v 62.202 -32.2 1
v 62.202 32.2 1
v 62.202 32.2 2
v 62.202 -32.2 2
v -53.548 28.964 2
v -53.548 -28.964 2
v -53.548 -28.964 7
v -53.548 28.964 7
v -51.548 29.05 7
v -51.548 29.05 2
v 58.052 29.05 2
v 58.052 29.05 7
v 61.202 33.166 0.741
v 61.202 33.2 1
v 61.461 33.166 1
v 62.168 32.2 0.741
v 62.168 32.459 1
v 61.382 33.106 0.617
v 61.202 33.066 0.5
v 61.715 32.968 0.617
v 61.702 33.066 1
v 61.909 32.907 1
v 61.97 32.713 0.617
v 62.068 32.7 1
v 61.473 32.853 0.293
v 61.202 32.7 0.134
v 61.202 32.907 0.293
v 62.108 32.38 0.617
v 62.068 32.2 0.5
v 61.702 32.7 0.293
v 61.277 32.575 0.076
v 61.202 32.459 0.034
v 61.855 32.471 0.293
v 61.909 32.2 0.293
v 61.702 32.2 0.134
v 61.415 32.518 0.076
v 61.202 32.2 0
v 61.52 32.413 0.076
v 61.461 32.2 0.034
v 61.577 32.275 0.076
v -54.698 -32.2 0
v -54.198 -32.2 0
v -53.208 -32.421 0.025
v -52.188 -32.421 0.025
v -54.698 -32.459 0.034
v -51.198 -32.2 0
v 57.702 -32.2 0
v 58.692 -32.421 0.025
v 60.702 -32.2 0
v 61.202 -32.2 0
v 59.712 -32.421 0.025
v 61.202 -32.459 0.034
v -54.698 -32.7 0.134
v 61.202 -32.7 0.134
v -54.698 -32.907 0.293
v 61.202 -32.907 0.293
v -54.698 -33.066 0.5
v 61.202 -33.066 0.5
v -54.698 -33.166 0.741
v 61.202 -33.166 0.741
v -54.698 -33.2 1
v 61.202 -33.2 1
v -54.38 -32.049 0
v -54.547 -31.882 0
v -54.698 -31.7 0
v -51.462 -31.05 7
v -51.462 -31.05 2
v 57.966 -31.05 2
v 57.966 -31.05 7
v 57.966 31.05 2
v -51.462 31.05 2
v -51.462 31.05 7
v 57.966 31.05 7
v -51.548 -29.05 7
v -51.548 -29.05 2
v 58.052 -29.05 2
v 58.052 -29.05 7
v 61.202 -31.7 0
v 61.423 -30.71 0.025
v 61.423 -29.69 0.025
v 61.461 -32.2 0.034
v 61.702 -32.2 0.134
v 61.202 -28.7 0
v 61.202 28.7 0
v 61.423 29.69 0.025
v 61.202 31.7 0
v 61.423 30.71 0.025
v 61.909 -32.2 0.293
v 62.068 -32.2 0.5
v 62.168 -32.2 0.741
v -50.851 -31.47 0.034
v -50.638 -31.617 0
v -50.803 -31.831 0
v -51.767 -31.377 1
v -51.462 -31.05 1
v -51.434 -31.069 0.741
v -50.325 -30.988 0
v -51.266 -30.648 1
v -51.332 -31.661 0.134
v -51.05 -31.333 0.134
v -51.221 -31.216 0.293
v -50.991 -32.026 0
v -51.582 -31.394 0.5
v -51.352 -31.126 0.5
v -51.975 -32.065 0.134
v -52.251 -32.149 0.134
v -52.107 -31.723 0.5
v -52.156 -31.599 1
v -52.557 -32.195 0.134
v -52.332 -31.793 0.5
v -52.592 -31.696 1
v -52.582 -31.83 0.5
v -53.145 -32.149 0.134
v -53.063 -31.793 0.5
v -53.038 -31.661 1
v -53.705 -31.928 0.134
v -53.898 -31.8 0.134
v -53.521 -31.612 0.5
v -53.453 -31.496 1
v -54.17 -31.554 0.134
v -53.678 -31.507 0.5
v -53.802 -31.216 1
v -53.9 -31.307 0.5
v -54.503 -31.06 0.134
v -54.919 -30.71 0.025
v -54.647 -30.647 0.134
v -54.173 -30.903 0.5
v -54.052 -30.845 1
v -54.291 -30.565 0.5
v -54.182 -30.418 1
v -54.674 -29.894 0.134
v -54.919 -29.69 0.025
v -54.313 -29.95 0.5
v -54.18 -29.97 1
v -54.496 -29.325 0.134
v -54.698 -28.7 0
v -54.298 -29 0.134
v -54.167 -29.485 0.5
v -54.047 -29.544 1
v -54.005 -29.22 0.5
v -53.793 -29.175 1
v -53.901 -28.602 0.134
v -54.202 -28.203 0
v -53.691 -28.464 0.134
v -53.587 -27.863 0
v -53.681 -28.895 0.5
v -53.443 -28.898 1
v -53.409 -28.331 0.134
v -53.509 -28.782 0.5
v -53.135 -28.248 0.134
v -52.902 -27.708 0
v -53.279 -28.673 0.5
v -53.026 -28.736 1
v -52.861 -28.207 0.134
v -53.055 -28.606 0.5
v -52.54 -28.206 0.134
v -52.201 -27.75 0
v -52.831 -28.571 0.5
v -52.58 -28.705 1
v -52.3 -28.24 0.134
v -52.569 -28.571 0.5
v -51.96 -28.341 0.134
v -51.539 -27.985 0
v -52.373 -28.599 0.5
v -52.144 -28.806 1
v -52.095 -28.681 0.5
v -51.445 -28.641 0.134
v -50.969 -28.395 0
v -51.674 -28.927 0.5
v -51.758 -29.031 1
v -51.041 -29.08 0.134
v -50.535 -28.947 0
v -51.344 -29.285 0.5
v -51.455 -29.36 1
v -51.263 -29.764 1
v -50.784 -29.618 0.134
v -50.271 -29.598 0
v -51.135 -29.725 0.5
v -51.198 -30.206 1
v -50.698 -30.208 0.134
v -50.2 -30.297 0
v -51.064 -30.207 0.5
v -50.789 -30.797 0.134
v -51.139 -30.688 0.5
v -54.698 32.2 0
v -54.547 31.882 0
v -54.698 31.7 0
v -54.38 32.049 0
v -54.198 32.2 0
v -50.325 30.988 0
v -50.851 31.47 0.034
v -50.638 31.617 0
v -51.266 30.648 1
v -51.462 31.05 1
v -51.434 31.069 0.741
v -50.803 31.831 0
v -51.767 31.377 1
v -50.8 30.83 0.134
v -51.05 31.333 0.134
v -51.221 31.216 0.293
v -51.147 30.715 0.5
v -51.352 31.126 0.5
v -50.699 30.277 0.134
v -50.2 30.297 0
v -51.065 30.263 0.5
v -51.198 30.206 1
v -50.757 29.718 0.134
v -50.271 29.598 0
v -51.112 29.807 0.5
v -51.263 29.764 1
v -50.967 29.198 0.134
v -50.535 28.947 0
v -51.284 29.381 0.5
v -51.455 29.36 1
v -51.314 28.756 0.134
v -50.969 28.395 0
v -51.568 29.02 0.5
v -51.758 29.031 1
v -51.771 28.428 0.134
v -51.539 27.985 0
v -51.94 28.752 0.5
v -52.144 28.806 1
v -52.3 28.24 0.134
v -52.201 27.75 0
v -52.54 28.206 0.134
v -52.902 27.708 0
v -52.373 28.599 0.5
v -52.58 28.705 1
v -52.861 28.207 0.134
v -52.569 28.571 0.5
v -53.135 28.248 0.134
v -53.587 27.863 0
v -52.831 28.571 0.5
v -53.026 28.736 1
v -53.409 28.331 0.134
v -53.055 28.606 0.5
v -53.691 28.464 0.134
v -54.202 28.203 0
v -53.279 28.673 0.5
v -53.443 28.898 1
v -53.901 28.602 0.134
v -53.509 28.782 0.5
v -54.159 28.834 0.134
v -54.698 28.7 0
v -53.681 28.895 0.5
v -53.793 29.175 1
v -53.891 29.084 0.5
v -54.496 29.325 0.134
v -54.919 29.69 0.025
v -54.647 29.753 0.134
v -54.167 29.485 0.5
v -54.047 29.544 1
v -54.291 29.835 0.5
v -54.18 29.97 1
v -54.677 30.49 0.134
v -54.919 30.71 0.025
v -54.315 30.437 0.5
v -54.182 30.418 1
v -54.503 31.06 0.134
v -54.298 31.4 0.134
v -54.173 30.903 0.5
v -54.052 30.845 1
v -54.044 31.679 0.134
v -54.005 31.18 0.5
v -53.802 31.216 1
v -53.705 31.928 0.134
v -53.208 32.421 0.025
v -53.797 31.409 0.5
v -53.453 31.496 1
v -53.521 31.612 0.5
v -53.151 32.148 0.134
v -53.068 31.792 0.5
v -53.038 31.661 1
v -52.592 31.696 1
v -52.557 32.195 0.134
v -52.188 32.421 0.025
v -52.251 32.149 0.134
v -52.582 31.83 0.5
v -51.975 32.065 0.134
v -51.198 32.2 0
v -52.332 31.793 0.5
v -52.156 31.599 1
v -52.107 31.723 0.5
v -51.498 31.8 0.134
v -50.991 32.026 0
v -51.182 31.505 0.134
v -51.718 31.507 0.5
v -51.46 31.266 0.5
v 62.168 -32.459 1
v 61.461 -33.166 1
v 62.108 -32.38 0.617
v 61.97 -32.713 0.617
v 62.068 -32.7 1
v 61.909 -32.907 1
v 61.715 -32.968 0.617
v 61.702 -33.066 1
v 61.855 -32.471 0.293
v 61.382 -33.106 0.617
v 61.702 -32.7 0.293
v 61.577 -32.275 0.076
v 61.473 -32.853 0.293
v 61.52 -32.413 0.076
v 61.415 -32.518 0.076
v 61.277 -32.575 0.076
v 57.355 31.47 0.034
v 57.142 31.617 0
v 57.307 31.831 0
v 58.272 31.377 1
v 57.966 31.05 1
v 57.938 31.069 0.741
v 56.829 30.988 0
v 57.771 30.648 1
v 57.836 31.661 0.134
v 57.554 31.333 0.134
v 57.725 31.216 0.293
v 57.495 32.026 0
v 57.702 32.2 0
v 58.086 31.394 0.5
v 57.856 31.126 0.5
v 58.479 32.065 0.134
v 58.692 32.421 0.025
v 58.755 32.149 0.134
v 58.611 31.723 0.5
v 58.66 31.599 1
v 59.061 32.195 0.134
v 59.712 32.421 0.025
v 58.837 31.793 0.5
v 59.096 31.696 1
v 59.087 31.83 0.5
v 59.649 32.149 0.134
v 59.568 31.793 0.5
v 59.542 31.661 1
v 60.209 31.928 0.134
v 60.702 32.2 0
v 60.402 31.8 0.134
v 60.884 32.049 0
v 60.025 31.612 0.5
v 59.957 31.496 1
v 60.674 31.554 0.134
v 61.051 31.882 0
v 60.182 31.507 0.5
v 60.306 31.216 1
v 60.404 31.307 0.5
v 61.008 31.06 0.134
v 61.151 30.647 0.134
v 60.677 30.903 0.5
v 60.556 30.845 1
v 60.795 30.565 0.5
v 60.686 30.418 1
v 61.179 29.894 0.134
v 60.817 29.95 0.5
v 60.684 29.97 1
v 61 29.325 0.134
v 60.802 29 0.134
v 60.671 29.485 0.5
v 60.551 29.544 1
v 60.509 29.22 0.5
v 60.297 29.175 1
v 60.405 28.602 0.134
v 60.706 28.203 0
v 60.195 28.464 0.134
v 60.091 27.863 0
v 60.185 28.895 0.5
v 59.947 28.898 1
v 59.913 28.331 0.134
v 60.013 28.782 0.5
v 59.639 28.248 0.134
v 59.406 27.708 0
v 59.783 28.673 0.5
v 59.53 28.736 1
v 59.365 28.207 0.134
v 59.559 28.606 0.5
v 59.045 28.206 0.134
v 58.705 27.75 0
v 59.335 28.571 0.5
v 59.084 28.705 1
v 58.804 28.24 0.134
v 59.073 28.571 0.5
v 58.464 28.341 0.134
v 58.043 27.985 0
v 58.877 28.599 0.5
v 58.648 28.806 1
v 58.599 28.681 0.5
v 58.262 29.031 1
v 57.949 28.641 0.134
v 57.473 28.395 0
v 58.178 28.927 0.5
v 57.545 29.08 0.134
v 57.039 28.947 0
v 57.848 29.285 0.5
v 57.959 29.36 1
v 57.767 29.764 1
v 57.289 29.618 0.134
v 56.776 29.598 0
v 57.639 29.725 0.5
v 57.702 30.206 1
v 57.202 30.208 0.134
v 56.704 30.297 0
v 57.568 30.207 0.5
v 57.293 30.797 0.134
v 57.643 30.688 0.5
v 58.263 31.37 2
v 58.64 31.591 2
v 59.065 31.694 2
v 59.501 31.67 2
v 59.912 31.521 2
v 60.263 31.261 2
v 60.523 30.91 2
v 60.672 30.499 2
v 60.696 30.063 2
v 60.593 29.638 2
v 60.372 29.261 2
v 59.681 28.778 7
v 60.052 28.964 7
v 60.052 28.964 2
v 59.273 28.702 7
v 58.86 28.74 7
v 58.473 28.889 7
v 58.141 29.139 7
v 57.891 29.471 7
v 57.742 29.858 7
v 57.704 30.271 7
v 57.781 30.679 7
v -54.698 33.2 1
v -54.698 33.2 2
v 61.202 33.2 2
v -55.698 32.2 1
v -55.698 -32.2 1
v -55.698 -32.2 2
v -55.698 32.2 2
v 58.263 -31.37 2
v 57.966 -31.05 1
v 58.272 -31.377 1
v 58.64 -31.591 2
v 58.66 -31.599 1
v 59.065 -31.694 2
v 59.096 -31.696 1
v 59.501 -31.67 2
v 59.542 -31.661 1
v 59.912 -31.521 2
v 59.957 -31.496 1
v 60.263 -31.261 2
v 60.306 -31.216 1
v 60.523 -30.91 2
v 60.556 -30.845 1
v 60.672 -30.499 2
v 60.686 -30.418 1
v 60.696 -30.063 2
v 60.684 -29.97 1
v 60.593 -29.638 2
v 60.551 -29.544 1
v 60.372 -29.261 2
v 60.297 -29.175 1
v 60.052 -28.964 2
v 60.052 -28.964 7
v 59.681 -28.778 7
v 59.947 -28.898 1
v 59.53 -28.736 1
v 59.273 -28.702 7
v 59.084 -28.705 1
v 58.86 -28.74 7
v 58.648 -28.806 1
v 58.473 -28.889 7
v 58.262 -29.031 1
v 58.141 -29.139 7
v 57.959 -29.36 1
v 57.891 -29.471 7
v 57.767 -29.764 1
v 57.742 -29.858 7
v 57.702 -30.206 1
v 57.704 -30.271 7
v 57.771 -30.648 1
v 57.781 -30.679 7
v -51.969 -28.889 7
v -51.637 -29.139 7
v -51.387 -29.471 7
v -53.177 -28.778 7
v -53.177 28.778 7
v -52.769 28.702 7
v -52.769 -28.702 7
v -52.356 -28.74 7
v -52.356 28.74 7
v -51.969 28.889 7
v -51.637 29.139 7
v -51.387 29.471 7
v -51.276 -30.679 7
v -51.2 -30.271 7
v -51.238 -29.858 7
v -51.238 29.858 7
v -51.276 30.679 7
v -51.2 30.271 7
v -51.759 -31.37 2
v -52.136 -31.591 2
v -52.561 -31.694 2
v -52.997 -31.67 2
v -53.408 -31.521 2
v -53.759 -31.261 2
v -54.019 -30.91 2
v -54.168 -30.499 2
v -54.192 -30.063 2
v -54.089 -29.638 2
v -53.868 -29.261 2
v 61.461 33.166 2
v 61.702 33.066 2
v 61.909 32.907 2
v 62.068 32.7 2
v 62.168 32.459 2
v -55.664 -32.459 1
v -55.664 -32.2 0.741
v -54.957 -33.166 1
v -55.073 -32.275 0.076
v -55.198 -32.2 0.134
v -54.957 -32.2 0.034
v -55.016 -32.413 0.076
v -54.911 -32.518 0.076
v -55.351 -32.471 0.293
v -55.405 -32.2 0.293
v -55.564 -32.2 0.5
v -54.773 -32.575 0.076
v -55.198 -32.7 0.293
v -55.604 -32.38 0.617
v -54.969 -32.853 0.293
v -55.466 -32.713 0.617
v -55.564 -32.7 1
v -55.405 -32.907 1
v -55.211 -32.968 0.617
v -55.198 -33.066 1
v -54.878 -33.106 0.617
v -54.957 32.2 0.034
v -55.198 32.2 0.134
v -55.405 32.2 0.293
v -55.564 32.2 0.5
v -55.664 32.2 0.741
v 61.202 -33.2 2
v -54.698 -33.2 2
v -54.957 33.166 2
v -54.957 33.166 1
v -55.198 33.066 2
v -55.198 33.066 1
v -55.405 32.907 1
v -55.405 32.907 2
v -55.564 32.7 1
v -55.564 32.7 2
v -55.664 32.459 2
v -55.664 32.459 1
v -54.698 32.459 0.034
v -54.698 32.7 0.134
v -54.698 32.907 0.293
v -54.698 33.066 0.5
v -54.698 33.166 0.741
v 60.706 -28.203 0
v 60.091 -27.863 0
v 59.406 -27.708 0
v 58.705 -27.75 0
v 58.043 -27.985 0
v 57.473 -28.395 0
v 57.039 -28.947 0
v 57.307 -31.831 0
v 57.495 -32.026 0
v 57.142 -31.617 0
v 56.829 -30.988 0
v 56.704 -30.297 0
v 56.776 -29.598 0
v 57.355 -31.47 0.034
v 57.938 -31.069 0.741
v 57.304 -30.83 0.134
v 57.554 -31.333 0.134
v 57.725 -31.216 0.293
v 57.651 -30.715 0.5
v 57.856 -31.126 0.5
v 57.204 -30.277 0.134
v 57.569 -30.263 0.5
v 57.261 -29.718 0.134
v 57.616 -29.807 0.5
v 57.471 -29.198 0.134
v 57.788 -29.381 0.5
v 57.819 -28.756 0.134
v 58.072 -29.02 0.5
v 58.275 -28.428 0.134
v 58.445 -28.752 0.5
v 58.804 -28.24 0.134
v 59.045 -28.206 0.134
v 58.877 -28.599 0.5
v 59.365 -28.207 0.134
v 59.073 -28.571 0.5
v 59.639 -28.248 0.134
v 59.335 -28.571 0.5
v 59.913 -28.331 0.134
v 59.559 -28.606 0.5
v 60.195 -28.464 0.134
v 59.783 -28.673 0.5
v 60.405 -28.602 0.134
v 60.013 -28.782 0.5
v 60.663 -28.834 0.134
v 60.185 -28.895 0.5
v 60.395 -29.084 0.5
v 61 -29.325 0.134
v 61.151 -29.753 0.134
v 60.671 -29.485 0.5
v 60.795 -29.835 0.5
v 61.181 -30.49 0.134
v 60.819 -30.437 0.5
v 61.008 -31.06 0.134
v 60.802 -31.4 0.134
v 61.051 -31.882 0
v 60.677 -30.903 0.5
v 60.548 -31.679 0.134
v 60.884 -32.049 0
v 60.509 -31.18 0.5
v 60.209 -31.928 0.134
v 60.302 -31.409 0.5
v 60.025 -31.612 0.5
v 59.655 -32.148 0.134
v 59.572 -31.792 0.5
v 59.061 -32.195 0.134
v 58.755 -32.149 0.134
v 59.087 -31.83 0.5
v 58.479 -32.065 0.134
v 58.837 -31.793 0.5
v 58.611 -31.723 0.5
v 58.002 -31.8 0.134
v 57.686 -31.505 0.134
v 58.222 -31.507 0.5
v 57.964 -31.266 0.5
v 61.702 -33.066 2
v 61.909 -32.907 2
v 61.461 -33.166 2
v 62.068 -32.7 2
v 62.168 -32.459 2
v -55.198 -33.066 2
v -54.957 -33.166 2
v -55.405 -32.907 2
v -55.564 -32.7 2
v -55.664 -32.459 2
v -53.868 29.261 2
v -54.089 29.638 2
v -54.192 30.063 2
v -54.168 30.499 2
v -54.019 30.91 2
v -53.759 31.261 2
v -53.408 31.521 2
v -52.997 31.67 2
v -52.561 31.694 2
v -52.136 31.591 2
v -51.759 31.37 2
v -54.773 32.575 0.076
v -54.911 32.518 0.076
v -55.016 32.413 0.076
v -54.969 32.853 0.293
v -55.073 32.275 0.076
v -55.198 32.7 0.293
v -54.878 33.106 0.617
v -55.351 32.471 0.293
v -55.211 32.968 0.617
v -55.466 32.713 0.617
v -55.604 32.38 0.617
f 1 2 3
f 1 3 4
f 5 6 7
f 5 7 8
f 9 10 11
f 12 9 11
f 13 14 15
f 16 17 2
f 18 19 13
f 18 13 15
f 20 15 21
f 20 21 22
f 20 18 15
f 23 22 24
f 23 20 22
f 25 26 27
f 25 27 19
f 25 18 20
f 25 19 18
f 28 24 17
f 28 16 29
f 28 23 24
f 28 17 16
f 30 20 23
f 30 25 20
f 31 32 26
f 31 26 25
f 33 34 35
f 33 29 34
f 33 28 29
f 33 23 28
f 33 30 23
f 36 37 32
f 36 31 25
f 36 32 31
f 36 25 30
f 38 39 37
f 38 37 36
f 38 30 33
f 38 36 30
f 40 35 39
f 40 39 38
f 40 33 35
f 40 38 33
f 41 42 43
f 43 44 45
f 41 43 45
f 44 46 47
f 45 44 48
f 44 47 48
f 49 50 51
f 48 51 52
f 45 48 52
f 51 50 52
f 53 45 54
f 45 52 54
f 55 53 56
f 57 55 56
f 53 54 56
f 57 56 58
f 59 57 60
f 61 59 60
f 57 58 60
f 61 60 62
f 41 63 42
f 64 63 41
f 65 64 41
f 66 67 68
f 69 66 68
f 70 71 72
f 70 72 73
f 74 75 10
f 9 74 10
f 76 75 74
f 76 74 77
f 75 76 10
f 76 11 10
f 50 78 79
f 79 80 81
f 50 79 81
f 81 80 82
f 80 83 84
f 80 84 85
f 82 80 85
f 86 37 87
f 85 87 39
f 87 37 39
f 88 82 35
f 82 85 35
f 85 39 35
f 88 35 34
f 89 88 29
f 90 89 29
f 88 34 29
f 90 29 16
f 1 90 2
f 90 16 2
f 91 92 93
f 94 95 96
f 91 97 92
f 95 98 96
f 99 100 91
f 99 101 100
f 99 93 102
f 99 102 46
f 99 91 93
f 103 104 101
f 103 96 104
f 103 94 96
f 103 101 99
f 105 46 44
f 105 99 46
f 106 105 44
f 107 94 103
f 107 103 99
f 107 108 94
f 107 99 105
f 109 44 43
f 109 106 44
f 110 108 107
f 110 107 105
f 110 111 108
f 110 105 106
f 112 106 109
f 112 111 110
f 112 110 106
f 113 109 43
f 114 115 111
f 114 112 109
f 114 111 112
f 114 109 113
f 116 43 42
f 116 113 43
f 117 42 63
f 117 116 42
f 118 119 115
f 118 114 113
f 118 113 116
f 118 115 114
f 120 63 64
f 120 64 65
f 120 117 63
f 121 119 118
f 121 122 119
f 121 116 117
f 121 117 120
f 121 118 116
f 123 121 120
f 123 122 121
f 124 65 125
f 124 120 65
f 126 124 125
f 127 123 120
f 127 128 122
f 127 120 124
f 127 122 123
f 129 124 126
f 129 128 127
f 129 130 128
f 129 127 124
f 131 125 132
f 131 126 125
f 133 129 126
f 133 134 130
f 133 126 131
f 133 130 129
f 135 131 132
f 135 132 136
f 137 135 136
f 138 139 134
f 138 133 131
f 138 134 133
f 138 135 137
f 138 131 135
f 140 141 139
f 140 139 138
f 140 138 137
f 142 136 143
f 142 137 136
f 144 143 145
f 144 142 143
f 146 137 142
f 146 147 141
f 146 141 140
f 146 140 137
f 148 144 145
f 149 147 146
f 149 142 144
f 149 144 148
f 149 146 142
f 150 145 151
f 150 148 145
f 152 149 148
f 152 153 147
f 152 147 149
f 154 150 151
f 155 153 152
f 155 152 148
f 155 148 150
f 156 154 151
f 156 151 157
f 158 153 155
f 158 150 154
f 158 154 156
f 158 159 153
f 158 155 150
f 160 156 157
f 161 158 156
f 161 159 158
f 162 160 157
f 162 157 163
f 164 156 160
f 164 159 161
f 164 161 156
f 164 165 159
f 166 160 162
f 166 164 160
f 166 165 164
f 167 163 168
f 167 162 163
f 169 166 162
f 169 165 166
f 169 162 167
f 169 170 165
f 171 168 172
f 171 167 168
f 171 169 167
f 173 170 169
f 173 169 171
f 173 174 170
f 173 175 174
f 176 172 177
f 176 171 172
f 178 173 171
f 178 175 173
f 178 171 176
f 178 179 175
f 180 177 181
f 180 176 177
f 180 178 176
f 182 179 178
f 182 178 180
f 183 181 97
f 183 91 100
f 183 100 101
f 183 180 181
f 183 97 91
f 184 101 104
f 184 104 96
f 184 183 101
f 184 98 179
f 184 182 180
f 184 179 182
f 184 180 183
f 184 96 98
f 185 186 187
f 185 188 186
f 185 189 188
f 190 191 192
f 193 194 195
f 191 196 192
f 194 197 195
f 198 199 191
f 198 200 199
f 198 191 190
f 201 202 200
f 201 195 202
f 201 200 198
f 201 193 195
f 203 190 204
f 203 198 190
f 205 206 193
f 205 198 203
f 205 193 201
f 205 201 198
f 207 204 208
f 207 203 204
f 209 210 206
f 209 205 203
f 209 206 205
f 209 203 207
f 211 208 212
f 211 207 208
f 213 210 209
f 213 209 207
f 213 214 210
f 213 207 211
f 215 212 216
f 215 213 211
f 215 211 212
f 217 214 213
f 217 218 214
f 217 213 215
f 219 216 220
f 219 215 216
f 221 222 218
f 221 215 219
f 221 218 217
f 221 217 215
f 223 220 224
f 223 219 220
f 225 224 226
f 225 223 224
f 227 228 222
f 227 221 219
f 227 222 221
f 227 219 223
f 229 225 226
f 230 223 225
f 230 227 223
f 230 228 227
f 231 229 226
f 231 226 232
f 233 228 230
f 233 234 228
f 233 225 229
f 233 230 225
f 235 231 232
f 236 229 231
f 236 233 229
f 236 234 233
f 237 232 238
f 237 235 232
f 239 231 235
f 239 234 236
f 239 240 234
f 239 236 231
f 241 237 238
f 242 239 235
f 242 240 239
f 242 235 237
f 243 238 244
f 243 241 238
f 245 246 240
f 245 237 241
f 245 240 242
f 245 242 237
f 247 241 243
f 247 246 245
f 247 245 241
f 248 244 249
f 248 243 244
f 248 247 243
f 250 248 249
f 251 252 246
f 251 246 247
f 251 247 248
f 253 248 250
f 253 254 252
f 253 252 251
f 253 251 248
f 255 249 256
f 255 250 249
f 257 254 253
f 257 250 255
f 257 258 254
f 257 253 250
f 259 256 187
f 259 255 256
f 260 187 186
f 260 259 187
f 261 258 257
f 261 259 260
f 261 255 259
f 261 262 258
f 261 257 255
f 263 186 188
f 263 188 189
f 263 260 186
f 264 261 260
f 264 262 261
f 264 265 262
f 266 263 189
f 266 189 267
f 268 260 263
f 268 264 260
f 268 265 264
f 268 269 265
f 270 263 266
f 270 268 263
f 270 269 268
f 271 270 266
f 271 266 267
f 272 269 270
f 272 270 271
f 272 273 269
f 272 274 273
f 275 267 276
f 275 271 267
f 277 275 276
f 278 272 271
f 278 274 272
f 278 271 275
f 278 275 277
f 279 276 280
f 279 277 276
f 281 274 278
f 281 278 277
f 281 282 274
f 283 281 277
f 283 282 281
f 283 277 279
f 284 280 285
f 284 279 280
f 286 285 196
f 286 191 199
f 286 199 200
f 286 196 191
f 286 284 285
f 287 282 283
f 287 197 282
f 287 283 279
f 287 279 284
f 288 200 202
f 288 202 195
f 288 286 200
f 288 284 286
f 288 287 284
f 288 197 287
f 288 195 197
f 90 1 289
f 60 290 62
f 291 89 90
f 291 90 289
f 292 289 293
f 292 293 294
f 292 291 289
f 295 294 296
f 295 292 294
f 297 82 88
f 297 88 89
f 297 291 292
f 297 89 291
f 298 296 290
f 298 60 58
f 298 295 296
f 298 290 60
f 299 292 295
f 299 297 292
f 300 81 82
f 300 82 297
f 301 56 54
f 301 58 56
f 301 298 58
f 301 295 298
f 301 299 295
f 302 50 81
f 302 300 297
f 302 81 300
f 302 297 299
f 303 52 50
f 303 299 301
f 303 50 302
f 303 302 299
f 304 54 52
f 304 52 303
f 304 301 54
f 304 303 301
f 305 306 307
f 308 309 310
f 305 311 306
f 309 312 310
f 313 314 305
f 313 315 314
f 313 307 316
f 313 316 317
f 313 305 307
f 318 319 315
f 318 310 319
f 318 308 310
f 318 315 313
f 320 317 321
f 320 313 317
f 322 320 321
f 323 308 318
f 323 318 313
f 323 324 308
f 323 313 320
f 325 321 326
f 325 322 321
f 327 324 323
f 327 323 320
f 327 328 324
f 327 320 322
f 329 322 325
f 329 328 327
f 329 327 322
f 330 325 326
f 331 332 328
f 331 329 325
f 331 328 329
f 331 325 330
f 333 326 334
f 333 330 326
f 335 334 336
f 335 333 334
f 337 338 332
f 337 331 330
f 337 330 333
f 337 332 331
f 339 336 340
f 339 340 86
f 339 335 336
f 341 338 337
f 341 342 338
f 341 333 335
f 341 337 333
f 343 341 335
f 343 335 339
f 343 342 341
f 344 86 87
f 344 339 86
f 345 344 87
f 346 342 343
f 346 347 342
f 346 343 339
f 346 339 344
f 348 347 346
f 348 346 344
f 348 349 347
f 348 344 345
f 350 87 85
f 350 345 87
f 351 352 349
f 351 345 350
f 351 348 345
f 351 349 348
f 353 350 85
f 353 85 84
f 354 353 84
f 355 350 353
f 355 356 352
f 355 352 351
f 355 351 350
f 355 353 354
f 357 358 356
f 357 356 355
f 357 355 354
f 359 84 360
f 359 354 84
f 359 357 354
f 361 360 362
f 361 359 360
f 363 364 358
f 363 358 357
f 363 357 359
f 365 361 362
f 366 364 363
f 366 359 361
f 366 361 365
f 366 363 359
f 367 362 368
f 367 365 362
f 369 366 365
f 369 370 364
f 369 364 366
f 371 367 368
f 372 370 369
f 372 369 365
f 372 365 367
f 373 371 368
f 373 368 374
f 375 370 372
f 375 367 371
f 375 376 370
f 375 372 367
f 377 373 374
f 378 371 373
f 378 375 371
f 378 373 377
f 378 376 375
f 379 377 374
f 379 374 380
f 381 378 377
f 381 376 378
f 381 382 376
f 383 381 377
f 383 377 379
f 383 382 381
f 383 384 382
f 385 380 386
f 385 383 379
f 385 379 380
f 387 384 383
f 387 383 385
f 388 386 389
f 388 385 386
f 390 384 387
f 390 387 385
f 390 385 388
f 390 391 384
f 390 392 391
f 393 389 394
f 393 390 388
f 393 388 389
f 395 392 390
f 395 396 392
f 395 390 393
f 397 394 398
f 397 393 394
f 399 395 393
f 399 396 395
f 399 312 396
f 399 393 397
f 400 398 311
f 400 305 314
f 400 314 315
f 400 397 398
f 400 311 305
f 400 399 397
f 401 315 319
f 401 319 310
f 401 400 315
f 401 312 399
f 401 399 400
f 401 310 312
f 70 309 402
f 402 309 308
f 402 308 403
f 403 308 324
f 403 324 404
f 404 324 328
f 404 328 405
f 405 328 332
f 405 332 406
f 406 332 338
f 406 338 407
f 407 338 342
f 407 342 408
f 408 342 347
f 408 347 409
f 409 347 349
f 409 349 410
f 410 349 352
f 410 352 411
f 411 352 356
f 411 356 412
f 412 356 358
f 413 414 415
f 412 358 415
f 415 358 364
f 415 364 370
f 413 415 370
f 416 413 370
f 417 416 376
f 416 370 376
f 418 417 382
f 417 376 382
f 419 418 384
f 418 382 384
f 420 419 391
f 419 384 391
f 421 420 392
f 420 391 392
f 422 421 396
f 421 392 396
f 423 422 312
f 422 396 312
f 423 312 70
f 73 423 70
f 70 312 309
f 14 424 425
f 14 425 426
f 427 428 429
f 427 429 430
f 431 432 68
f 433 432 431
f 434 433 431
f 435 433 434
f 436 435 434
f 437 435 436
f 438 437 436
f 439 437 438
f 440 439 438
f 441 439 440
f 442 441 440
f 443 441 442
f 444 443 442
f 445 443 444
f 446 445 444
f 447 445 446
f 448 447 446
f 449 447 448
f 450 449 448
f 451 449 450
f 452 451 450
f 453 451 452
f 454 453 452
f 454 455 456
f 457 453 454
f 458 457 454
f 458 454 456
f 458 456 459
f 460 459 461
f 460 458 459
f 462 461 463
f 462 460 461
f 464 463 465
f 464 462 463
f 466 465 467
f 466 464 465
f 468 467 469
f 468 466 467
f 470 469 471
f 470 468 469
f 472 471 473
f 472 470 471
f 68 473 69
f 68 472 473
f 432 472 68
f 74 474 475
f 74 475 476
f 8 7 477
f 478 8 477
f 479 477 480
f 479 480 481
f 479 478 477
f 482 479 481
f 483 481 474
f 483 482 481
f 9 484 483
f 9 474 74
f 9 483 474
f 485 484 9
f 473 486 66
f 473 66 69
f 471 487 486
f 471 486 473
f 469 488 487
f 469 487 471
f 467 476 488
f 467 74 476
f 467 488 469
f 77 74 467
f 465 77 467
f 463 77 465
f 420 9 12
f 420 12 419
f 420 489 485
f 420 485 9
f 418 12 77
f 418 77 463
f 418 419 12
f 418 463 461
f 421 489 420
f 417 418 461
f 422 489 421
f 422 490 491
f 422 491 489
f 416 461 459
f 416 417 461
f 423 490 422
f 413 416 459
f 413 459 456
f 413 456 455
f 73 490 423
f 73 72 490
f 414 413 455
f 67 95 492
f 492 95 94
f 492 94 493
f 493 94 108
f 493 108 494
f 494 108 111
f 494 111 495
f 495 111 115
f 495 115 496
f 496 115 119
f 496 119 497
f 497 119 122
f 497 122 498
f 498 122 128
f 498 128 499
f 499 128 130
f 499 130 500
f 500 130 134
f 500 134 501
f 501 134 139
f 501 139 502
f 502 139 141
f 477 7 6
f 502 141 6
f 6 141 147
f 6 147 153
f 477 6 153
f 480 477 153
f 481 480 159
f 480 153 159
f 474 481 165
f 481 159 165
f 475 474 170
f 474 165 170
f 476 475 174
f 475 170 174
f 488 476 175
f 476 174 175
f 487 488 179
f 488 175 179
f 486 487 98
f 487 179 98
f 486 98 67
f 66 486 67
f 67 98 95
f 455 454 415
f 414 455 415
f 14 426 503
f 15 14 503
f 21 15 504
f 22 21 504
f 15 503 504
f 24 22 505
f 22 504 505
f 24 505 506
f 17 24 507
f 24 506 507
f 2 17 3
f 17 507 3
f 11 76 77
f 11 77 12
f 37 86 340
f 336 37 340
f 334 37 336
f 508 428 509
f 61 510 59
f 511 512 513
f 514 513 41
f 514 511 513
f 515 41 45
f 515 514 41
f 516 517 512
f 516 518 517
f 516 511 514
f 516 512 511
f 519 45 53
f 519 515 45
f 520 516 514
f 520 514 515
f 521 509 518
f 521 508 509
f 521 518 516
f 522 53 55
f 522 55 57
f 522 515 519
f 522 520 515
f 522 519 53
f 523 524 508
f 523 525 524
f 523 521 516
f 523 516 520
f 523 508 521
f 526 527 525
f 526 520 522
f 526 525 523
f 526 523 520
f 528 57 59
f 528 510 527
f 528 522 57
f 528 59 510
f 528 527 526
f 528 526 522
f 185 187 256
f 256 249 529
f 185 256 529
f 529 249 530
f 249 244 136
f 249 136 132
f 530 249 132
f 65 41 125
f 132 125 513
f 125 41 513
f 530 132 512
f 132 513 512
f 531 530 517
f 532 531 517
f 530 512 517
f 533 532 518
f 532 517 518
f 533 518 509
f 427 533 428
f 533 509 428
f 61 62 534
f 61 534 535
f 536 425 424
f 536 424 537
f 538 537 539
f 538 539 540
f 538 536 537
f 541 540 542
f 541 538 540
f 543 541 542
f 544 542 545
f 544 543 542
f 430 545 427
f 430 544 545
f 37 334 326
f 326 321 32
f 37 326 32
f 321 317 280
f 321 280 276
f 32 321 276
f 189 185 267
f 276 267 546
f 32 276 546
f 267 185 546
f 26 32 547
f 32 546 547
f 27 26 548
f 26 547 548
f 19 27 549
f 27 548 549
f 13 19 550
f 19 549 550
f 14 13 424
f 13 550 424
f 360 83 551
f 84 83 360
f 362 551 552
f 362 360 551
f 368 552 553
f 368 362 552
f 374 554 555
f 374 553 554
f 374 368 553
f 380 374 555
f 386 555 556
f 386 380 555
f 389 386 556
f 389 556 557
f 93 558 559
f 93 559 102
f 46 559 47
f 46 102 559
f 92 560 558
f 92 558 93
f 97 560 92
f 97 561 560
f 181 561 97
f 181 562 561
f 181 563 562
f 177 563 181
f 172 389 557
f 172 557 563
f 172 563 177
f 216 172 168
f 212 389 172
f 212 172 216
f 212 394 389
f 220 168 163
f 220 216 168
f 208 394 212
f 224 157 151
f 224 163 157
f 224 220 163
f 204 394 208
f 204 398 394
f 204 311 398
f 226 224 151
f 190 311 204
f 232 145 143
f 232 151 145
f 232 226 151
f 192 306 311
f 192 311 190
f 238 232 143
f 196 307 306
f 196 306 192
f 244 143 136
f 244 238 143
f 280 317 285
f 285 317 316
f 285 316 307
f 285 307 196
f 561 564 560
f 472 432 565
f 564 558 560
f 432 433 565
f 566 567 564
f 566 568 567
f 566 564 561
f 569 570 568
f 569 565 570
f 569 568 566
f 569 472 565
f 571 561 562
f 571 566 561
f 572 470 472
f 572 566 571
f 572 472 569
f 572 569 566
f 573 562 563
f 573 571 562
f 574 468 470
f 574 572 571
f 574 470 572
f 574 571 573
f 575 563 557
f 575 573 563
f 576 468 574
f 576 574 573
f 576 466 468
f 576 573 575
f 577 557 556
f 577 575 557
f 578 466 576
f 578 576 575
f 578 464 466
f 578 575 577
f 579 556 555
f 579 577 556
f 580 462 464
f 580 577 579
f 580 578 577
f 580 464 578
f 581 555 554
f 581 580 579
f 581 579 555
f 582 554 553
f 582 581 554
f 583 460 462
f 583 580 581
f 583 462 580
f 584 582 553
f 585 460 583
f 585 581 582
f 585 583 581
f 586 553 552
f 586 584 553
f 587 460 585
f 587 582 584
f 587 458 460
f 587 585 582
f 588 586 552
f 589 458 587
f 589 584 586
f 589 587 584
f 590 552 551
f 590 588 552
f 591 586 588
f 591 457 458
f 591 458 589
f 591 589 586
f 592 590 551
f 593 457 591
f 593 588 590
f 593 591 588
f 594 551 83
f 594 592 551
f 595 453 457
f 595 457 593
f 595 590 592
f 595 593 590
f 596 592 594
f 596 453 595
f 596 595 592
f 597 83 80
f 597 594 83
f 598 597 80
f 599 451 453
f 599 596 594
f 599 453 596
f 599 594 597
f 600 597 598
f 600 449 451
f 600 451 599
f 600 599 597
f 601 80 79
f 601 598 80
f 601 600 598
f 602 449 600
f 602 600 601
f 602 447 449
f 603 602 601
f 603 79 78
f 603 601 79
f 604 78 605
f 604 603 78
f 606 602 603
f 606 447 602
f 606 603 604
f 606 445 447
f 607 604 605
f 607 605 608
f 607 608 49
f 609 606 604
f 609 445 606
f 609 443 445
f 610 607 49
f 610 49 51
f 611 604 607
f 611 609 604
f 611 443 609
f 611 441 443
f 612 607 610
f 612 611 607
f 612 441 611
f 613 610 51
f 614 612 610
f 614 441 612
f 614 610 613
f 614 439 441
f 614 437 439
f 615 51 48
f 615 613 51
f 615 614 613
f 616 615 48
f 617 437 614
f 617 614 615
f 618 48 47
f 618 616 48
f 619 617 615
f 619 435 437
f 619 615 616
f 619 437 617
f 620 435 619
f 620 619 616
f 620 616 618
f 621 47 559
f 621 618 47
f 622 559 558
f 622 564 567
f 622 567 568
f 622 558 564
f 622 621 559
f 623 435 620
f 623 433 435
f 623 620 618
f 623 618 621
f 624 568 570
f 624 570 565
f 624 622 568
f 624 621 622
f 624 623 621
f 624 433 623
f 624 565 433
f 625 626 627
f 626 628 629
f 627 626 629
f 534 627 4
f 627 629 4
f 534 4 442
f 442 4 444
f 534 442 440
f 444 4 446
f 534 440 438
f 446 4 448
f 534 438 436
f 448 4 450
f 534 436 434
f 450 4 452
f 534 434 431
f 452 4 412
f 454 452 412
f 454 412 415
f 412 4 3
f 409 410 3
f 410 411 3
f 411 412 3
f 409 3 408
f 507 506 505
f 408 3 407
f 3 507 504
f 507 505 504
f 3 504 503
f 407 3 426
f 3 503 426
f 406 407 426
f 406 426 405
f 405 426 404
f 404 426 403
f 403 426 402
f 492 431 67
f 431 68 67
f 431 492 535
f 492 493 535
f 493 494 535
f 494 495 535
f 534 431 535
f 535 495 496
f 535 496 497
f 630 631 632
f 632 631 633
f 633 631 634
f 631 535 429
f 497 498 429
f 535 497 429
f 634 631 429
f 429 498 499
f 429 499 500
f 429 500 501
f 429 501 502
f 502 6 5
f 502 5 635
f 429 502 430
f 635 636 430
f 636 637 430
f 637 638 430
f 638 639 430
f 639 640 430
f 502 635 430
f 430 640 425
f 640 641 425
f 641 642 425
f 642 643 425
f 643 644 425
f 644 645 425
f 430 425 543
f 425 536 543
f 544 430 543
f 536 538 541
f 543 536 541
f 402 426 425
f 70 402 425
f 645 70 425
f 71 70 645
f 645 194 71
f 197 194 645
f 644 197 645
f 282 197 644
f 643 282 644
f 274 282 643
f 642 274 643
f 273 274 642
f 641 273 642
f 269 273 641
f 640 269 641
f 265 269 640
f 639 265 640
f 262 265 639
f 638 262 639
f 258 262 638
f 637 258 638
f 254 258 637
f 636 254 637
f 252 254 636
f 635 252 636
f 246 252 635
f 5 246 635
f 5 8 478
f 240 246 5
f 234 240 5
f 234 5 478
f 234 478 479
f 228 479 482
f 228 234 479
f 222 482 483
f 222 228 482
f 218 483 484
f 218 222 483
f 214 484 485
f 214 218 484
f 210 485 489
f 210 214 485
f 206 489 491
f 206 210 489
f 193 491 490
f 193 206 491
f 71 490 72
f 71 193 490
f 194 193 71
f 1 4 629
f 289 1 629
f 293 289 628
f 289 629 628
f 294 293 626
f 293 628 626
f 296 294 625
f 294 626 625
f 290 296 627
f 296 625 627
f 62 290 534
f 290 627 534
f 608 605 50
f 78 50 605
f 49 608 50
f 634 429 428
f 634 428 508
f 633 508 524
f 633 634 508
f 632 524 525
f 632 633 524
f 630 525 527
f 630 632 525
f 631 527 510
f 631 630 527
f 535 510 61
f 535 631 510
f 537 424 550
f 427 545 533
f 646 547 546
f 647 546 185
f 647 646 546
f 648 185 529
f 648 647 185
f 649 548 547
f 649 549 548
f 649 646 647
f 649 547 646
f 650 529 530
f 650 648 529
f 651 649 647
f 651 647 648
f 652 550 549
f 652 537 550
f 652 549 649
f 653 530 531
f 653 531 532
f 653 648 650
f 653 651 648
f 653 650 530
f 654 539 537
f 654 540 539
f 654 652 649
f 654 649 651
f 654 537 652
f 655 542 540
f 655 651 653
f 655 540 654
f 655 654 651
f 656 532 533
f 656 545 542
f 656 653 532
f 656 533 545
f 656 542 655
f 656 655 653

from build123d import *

# Parameters (mm, degrees)
BOSS_EXTRUDE1_DEPTH                        = 2
SKETCH2_W                                  = 113.60000000000001
SKETCH2_H                                  = 62.1
SKETCH2_W_2                                = 109.60000000000001
SKETCH2_H_2                                = 58.1
BOSS_EXTRUDE2_DEPTH                        = 5
SKETCH3_R                                  = 1.5000000000000042
CUT_EXTRUDE2_DEPTH                         = 71.85433681838424
MIRROR3_AT_THE_SECOND_PLANE_COPY_1_SKETC_R = 1.5000000000000042
MIRROR3_AT_THE_SECOND_PLANE_COPY_1_DEPTH   = 71.85433681838424
FILLET1_R                                  = 1
FILLET2_R                                  = 1


with BuildPart() as part:
    # Sketch1 → Boss-Extrude1 (new body)
    with BuildSketch(Plane.XY):
        Polygon((-55.697933748362985, 33.2), (62.20206625163701, 33.2), (62.202066251637014, -33.2), (-55.697933748362985, -33.2), align=None)
    extrude(amount=BOSS_EXTRUDE1_DEPTH)

    # Sketch2 → Boss-Extrude2 (add)
    with BuildSketch(Plane.XY.offset(2)):
        with Locations((3.252066251637011, 0)):
            Rectangle(SKETCH2_W, SKETCH2_H)
        with Locations((3.252066251637011, 0)):
            Rectangle(SKETCH2_W_2, SKETCH2_H_2, mode=Mode.SUBTRACT)
    extrude(amount=BOSS_EXTRUDE2_DEPTH)

    # Sketch3 → Cut-Extrude2 (cut, symmetric)
    with BuildSketch(Plane(origin=(0, 0, 0), x_dir=(-1, 0, 0), z_dir=(0, 0, -1))):
        with Locations(Location((-59.202066251637, 30.200000000000003, 0), (0, 0, 34.518107841))):
            Circle(SKETCH3_R)
    cut_extrude2 = extrude(amount=CUT_EXTRUDE2_DEPTH, both=True, mode=Mode.SUBTRACT)

    # Mirror2: Cut-Extrude2 across plane
    add(cut_extrude2.mirror(Plane.ZX), mode=Mode.SUBTRACT)

    # Mirror3: Cut-Extrude2 across plane
    add(cut_extrude2.mirror(Plane.ZX), mode=Mode.SUBTRACT)

    # Mirror3 at the second plane: Cut-Extrude2 across plane
    add(cut_extrude2.mirror(Plane(origin=(3.2520662516370114, 0, 0), x_dir=(0, 0, 1), z_dir=(1, 0, 0))), mode=Mode.SUBTRACT)

    # Mirror3 at the second plane copy 1 sketc → Mirror3 at the second plane copy 1 (cut, symmetric)
    with BuildSketch(Plane(origin=(6.504132503274023, 0, 0), x_dir=(1, 0, 0), z_dir=(0, 0, -1))):
        with Locations(Location((-59.202066251637, 30.200000000000003, 0), (0, 0, 34.518107841))):
            Circle(MIRROR3_AT_THE_SECOND_PLANE_COPY_1_SKETC_R)
    extrude(amount=MIRROR3_AT_THE_SECOND_PLANE_COPY_1_DEPTH, both=True, mode=Mode.SUBTRACT)

    # Fillet1
    fillet1_edges = [part.edges().sort_by_distance(p)[0] for p in [
        (62.202066251637014, -33.2, 1),
        (-55.697933748362985, -33.2, 1),
        (-55.697933748362985, 33.2, 1),
        (62.20206625163701, 33.2, 1),
    ]]
    fillet(fillet1_edges, radius=FILLET1_R)

    # Fillet2
    # the kernel refuses this fillet: 1 mm, written as the material it takes off along each edge
    with BuildSketch(Plane(origin=(62.20206625163701, 32.2, 0), x_dir=(-1, -1.1e-16, 0), z_dir=(1.1e-16, -1, 0)), Plane(origin=(-55.697933748362985, -32.2, 0), x_dir=(1, 0, 0), z_dir=(0, 1, 0))) as fillet2_piece_1:
        with BuildLine():
            CenterArc((FILLET2_R, -FILLET2_R), FILLET2_R, 90, 90)
            Line((0, -FILLET2_R), (0, 0))
            Line((0, 0), (FILLET2_R, 0))
        make_face()
    extrude(amount=64.4, mode=Mode.SUBTRACT)
    with BuildSketch(Plane(origin=(61.202066251637014, -33.2, 0), x_dir=(0, 1, 0), z_dir=(-1, 0, 0))) as fillet2_piece_2:
        with BuildLine():
            CenterArc((FILLET2_R, -FILLET2_R), FILLET2_R, 90, 90)
            Line((0, -FILLET2_R), (0, 0))
            Line((0, 0), (FILLET2_R, 0))
        make_face()
    extrude(amount=115.9, mode=Mode.SUBTRACT)
    with BuildSketch(Plane(origin=(-54.697933748362985, 33.2, 0), x_dir=(0, 0, 1), z_dir=(1, 0, 0))) as fillet2_piece_3:
        with BuildLine():
            CenterArc((FILLET2_R, FILLET2_R), FILLET2_R, 180, 90)
            Line((-1.1e-16, FILLET2_R), (0, 0))
            Line((0, 0), (FILLET2_R, 0))
        make_face()
    extrude(amount=115.89999999999999, mode=Mode.SUBTRACT)
    with BuildSketch(Plane(origin=(-54.697933748362985, -32.2, 0), x_dir=(-1, 0, 0), z_dir=(0, 1, 0))) as fillet2_piece_4:
        with BuildLine():
            CenterArc((1 - FILLET2_R, FILLET2_R), FILLET2_R, 270, 90)
            Line((1, FILLET2_R), (1, 0))
            Line((1, 0), (1 - FILLET2_R, 0))
        make_face()
    revolve(axis=Axis((-54.697933748362985, -32.2, 0), (0, 0, 1)), revolution_arc=90, mode=Mode.SUBTRACT)
    with BuildSketch(Plane(origin=(-54.697933748362985, 32.2, 0), x_dir=(0, 1, 0), z_dir=(1, 0, 0))) as fillet2_piece_5:
        with BuildLine():
            CenterArc((1 - FILLET2_R, FILLET2_R), FILLET2_R, 270, 90)
            Line((1, FILLET2_R), (1, 0))
            Line((1, 0), (1 - FILLET2_R, 0))
        make_face()
    revolve(axis=Axis((-54.697933748362985, 32.2, 0), (0, 0, 1)), revolution_arc=90, mode=Mode.SUBTRACT)
    with BuildSketch(Plane(origin=(61.20206625163701, 32.2, 0), x_dir=(0, 1, 0), z_dir=(-1, 0, 0))) as fillet2_piece_6:
        with BuildLine():
            CenterArc((1 - FILLET2_R, -FILLET2_R), FILLET2_R, 6.36e-15, 90)
            Line((1, -FILLET2_R), (1, 0))
            Line((1, 0), (1 - FILLET2_R, 0))
        make_face()
    revolve(axis=Axis((61.20206625163701, 32.2, 0), (0, 0, -1)), revolution_arc=90, mode=Mode.SUBTRACT)
    with BuildSketch(Plane(origin=(61.202066251637014, -32.2, 0), x_dir=(1, 0, 0), z_dir=(0, 1, 0))) as fillet2_piece_7:
        with BuildLine():
            CenterArc((1 - FILLET2_R, -FILLET2_R), FILLET2_R, 6.36e-15, 90)
            Line((1, -FILLET2_R), (1, 0))
            Line((1, 0), (1 - FILLET2_R, 0))
        make_face()
    revolve(axis=Axis((61.202066251637014, -32.2, 0), (0, 0, -1)), revolution_arc=90, mode=Mode.SUBTRACT)
    with BuildSketch(Plane(origin=(59.202066251637, 30.200000000000003, 0), x_dir=(-0.8239471396211576, 0.5666666666657856, 0), z_dir=(-0.5666666666657856, -0.8239471396211576, 0))) as fillet2_piece_8:
        with BuildLine():
            CenterArc((1.5000000000000024 + FILLET2_R, -FILLET2_R), FILLET2_R, 90, 90)
            Line((1.5000000000000024, -FILLET2_R), (1.5000000000000024, 0))
            Line((1.5000000000000024, 0), (1.5000000000000024 + FILLET2_R, 0))
        make_face()
    revolve(axis=Axis((59.202066251637, 30.200000000000003, 0), (0, 0, -1)), mode=Mode.SUBTRACT)
    with BuildSketch(Plane(origin=(59.202066251637, -30.200000000000003, 0), x_dir=(-0.8239471396211576, -0.5666666666657856, 0), z_dir=(0.5666666666657856, -0.8239471396211576, 0))) as fillet2_piece_9:
        with BuildLine():
            CenterArc((1.5000000000000024 + FILLET2_R, -FILLET2_R), FILLET2_R, 90, 90)
            Line((1.5000000000000024, -FILLET2_R), (1.5000000000000024, 0))
            Line((1.5000000000000024, 0), (1.5000000000000024 + FILLET2_R, 0))
        make_face()
    revolve(axis=Axis((59.202066251637, -30.200000000000003, 0), (0, 0, -1)), mode=Mode.SUBTRACT)
    with BuildSketch(Plane(origin=(-52.69793374836298, 30.200000000000003, 0), x_dir=(0.8239471396211576, 0.5666666666657856, 0), z_dir=(-0.5666666666657856, 0.8239471396211576, 0))) as fillet2_piece_10:
        with BuildLine():
            CenterArc((1.5000000000000024 + FILLET2_R, -FILLET2_R), FILLET2_R, 90, 90)
            Line((1.5000000000000062, -FILLET2_R), (1.5000000000000024, 0))
            Line((1.5000000000000024, 0), (1.5000000000000024 + FILLET2_R, 0))
        make_face()
    revolve(axis=Axis((-52.69793374836298, 30.200000000000003, 0), (0, 0, -1)), mode=Mode.SUBTRACT)
    with BuildSketch(Plane(origin=(-52.69793374836298, -30.200000000000003, 0), x_dir=(0.8239471396211576, -0.5666666666657856, 0), z_dir=(0.5666666666657856, 0.8239471396211576, 0))) as fillet2_piece_11:
        with BuildLine():
            CenterArc((1.5000000000000024 + FILLET2_R, -FILLET2_R), FILLET2_R, 90, 90)
            Line((1.5000000000000062, -FILLET2_R), (1.5000000000000024, 0))
            Line((1.5000000000000024, 0), (1.5000000000000024 + FILLET2_R, 0))
        make_face()
    revolve(axis=Axis((-52.69793374836298, -30.200000000000003, 0), (0, 0, -1)), mode=Mode.SUBTRACT)


solid = part.part
